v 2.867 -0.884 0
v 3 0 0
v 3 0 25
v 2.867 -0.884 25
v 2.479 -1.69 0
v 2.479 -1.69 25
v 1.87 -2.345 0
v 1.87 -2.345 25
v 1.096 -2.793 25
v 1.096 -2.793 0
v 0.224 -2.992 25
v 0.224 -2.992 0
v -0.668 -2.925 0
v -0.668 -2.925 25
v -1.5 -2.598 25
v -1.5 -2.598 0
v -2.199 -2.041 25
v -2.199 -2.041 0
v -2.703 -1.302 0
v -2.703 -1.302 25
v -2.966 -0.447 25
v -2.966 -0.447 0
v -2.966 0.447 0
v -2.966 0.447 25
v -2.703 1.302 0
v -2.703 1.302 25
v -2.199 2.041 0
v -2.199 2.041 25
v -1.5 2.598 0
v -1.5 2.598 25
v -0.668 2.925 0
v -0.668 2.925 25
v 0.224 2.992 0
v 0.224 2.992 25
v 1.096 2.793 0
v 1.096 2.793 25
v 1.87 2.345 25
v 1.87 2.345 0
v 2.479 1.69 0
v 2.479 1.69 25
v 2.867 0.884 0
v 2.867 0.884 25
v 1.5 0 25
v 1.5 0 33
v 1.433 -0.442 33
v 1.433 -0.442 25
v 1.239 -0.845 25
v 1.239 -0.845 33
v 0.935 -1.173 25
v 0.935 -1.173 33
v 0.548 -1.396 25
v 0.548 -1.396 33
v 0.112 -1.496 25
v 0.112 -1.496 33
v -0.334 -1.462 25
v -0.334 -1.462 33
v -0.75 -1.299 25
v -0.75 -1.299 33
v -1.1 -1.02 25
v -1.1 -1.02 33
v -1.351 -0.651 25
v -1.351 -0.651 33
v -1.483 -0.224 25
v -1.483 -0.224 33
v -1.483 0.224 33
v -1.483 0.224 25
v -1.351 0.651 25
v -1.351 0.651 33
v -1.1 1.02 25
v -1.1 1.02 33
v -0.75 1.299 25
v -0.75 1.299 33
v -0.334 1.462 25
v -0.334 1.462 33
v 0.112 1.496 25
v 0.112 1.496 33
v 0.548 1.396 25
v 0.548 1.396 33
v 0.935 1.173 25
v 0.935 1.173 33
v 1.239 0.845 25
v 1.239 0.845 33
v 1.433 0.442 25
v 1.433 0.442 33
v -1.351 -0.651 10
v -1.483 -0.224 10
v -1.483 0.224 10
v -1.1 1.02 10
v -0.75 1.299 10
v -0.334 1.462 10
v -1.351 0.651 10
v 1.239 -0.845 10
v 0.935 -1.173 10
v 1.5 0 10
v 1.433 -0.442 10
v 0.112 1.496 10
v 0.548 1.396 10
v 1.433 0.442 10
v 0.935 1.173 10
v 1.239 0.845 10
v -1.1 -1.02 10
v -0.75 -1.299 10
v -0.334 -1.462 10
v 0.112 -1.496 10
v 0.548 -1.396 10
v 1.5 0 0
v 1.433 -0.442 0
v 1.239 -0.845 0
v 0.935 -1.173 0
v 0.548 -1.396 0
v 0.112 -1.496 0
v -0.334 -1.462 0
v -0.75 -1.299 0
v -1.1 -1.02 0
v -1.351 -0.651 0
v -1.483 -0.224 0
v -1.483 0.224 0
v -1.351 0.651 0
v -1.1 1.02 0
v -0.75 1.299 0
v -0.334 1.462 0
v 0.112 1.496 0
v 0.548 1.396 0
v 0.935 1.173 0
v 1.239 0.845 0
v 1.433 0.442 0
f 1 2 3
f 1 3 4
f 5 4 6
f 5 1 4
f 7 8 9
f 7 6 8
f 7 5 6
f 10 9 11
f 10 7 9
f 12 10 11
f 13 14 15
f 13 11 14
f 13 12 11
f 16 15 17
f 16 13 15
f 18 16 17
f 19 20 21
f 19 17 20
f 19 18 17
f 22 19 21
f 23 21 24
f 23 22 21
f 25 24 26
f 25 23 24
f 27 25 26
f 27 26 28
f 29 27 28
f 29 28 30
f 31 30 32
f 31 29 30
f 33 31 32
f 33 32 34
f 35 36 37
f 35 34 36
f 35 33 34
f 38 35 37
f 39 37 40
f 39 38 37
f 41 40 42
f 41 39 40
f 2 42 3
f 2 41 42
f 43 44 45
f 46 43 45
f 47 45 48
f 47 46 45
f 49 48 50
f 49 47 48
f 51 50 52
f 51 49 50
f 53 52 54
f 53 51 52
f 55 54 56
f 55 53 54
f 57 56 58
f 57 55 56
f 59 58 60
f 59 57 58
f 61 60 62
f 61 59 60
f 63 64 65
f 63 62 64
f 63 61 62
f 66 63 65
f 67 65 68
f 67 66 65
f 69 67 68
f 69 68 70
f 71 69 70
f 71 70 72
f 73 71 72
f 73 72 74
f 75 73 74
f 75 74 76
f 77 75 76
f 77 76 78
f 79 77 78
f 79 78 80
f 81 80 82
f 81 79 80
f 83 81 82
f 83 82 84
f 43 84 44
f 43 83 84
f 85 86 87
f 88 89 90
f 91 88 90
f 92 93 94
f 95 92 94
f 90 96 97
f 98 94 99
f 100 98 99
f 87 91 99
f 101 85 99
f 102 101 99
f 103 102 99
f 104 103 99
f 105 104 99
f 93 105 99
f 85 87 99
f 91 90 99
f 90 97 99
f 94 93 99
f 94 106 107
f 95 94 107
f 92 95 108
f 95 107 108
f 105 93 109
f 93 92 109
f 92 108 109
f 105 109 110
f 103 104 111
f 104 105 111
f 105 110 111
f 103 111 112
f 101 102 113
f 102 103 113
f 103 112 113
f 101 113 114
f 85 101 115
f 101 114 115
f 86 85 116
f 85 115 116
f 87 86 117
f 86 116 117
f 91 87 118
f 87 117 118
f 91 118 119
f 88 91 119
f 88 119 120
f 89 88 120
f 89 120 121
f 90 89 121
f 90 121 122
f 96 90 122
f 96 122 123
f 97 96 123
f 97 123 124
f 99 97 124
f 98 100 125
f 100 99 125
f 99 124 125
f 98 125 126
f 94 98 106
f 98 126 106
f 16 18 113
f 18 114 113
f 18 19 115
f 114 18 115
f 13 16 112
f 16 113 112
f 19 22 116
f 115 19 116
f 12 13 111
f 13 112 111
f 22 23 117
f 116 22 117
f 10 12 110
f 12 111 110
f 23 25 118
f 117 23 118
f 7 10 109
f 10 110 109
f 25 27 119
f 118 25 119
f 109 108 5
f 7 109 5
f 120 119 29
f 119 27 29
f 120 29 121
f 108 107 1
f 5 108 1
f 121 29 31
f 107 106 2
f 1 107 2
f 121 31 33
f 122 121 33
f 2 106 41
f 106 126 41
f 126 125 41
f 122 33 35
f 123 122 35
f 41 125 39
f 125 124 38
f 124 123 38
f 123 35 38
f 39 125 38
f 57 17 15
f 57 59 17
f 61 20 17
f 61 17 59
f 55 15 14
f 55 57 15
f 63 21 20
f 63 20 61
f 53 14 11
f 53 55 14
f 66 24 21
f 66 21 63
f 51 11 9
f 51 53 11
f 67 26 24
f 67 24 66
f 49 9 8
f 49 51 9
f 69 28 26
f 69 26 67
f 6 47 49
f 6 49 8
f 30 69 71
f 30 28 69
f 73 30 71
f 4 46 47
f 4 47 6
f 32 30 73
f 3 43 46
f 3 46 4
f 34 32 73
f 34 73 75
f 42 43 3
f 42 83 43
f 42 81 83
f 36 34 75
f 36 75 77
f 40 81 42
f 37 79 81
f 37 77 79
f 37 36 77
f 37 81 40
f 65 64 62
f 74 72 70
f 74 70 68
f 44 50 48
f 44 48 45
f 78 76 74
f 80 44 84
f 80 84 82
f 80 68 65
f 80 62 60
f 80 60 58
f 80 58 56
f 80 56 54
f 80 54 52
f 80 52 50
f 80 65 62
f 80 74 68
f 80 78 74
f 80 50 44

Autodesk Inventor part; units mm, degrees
ref_plane "YZ Plane" through (0, 0, 0) normal (1, 0, 0) x (0, 1, 0)
ref_plane "XZ Plane" through (0, 0, 0) normal (0, 1, 0) x (-1, 0, 0)
ref_plane "XY Plane" through (0, 0, 0) normal (0, 0, 1) x (1, 0, 0)
sketch "Sketch1" plane through (0, 0, 0) normal (0, 0, 1) x (1, 0, 0)
  circle A0 centre (0, 0) radius 3
  circle A1 centre (0, 0) radius 1.5
  dimension "d0" = 6
  dimension "d1" = 3
extrude "Extrusion1" add sketch "Sketch1" along normal blind 25 contours A0 | A1
extrude "Extrusion2" cut sketch "Sketch1" along normal blind 10 contours A1
extrude "Extrusion3" add sketch "Sketch1" along normal blind 8 from surface at 25 contours A1
thread "Thread1" size "M3x0.5" class "6g" standard "ANSI Metric M Profile" full length
thread "Thread2" size "M3x0.5" class "6H" standard "ANSI Metric M Profile" full length
properties part number "Abstandsbolzen PA6.6 schwarz IA Ø6x20 I=M3x10 A=M3x8 o. Freistich"
